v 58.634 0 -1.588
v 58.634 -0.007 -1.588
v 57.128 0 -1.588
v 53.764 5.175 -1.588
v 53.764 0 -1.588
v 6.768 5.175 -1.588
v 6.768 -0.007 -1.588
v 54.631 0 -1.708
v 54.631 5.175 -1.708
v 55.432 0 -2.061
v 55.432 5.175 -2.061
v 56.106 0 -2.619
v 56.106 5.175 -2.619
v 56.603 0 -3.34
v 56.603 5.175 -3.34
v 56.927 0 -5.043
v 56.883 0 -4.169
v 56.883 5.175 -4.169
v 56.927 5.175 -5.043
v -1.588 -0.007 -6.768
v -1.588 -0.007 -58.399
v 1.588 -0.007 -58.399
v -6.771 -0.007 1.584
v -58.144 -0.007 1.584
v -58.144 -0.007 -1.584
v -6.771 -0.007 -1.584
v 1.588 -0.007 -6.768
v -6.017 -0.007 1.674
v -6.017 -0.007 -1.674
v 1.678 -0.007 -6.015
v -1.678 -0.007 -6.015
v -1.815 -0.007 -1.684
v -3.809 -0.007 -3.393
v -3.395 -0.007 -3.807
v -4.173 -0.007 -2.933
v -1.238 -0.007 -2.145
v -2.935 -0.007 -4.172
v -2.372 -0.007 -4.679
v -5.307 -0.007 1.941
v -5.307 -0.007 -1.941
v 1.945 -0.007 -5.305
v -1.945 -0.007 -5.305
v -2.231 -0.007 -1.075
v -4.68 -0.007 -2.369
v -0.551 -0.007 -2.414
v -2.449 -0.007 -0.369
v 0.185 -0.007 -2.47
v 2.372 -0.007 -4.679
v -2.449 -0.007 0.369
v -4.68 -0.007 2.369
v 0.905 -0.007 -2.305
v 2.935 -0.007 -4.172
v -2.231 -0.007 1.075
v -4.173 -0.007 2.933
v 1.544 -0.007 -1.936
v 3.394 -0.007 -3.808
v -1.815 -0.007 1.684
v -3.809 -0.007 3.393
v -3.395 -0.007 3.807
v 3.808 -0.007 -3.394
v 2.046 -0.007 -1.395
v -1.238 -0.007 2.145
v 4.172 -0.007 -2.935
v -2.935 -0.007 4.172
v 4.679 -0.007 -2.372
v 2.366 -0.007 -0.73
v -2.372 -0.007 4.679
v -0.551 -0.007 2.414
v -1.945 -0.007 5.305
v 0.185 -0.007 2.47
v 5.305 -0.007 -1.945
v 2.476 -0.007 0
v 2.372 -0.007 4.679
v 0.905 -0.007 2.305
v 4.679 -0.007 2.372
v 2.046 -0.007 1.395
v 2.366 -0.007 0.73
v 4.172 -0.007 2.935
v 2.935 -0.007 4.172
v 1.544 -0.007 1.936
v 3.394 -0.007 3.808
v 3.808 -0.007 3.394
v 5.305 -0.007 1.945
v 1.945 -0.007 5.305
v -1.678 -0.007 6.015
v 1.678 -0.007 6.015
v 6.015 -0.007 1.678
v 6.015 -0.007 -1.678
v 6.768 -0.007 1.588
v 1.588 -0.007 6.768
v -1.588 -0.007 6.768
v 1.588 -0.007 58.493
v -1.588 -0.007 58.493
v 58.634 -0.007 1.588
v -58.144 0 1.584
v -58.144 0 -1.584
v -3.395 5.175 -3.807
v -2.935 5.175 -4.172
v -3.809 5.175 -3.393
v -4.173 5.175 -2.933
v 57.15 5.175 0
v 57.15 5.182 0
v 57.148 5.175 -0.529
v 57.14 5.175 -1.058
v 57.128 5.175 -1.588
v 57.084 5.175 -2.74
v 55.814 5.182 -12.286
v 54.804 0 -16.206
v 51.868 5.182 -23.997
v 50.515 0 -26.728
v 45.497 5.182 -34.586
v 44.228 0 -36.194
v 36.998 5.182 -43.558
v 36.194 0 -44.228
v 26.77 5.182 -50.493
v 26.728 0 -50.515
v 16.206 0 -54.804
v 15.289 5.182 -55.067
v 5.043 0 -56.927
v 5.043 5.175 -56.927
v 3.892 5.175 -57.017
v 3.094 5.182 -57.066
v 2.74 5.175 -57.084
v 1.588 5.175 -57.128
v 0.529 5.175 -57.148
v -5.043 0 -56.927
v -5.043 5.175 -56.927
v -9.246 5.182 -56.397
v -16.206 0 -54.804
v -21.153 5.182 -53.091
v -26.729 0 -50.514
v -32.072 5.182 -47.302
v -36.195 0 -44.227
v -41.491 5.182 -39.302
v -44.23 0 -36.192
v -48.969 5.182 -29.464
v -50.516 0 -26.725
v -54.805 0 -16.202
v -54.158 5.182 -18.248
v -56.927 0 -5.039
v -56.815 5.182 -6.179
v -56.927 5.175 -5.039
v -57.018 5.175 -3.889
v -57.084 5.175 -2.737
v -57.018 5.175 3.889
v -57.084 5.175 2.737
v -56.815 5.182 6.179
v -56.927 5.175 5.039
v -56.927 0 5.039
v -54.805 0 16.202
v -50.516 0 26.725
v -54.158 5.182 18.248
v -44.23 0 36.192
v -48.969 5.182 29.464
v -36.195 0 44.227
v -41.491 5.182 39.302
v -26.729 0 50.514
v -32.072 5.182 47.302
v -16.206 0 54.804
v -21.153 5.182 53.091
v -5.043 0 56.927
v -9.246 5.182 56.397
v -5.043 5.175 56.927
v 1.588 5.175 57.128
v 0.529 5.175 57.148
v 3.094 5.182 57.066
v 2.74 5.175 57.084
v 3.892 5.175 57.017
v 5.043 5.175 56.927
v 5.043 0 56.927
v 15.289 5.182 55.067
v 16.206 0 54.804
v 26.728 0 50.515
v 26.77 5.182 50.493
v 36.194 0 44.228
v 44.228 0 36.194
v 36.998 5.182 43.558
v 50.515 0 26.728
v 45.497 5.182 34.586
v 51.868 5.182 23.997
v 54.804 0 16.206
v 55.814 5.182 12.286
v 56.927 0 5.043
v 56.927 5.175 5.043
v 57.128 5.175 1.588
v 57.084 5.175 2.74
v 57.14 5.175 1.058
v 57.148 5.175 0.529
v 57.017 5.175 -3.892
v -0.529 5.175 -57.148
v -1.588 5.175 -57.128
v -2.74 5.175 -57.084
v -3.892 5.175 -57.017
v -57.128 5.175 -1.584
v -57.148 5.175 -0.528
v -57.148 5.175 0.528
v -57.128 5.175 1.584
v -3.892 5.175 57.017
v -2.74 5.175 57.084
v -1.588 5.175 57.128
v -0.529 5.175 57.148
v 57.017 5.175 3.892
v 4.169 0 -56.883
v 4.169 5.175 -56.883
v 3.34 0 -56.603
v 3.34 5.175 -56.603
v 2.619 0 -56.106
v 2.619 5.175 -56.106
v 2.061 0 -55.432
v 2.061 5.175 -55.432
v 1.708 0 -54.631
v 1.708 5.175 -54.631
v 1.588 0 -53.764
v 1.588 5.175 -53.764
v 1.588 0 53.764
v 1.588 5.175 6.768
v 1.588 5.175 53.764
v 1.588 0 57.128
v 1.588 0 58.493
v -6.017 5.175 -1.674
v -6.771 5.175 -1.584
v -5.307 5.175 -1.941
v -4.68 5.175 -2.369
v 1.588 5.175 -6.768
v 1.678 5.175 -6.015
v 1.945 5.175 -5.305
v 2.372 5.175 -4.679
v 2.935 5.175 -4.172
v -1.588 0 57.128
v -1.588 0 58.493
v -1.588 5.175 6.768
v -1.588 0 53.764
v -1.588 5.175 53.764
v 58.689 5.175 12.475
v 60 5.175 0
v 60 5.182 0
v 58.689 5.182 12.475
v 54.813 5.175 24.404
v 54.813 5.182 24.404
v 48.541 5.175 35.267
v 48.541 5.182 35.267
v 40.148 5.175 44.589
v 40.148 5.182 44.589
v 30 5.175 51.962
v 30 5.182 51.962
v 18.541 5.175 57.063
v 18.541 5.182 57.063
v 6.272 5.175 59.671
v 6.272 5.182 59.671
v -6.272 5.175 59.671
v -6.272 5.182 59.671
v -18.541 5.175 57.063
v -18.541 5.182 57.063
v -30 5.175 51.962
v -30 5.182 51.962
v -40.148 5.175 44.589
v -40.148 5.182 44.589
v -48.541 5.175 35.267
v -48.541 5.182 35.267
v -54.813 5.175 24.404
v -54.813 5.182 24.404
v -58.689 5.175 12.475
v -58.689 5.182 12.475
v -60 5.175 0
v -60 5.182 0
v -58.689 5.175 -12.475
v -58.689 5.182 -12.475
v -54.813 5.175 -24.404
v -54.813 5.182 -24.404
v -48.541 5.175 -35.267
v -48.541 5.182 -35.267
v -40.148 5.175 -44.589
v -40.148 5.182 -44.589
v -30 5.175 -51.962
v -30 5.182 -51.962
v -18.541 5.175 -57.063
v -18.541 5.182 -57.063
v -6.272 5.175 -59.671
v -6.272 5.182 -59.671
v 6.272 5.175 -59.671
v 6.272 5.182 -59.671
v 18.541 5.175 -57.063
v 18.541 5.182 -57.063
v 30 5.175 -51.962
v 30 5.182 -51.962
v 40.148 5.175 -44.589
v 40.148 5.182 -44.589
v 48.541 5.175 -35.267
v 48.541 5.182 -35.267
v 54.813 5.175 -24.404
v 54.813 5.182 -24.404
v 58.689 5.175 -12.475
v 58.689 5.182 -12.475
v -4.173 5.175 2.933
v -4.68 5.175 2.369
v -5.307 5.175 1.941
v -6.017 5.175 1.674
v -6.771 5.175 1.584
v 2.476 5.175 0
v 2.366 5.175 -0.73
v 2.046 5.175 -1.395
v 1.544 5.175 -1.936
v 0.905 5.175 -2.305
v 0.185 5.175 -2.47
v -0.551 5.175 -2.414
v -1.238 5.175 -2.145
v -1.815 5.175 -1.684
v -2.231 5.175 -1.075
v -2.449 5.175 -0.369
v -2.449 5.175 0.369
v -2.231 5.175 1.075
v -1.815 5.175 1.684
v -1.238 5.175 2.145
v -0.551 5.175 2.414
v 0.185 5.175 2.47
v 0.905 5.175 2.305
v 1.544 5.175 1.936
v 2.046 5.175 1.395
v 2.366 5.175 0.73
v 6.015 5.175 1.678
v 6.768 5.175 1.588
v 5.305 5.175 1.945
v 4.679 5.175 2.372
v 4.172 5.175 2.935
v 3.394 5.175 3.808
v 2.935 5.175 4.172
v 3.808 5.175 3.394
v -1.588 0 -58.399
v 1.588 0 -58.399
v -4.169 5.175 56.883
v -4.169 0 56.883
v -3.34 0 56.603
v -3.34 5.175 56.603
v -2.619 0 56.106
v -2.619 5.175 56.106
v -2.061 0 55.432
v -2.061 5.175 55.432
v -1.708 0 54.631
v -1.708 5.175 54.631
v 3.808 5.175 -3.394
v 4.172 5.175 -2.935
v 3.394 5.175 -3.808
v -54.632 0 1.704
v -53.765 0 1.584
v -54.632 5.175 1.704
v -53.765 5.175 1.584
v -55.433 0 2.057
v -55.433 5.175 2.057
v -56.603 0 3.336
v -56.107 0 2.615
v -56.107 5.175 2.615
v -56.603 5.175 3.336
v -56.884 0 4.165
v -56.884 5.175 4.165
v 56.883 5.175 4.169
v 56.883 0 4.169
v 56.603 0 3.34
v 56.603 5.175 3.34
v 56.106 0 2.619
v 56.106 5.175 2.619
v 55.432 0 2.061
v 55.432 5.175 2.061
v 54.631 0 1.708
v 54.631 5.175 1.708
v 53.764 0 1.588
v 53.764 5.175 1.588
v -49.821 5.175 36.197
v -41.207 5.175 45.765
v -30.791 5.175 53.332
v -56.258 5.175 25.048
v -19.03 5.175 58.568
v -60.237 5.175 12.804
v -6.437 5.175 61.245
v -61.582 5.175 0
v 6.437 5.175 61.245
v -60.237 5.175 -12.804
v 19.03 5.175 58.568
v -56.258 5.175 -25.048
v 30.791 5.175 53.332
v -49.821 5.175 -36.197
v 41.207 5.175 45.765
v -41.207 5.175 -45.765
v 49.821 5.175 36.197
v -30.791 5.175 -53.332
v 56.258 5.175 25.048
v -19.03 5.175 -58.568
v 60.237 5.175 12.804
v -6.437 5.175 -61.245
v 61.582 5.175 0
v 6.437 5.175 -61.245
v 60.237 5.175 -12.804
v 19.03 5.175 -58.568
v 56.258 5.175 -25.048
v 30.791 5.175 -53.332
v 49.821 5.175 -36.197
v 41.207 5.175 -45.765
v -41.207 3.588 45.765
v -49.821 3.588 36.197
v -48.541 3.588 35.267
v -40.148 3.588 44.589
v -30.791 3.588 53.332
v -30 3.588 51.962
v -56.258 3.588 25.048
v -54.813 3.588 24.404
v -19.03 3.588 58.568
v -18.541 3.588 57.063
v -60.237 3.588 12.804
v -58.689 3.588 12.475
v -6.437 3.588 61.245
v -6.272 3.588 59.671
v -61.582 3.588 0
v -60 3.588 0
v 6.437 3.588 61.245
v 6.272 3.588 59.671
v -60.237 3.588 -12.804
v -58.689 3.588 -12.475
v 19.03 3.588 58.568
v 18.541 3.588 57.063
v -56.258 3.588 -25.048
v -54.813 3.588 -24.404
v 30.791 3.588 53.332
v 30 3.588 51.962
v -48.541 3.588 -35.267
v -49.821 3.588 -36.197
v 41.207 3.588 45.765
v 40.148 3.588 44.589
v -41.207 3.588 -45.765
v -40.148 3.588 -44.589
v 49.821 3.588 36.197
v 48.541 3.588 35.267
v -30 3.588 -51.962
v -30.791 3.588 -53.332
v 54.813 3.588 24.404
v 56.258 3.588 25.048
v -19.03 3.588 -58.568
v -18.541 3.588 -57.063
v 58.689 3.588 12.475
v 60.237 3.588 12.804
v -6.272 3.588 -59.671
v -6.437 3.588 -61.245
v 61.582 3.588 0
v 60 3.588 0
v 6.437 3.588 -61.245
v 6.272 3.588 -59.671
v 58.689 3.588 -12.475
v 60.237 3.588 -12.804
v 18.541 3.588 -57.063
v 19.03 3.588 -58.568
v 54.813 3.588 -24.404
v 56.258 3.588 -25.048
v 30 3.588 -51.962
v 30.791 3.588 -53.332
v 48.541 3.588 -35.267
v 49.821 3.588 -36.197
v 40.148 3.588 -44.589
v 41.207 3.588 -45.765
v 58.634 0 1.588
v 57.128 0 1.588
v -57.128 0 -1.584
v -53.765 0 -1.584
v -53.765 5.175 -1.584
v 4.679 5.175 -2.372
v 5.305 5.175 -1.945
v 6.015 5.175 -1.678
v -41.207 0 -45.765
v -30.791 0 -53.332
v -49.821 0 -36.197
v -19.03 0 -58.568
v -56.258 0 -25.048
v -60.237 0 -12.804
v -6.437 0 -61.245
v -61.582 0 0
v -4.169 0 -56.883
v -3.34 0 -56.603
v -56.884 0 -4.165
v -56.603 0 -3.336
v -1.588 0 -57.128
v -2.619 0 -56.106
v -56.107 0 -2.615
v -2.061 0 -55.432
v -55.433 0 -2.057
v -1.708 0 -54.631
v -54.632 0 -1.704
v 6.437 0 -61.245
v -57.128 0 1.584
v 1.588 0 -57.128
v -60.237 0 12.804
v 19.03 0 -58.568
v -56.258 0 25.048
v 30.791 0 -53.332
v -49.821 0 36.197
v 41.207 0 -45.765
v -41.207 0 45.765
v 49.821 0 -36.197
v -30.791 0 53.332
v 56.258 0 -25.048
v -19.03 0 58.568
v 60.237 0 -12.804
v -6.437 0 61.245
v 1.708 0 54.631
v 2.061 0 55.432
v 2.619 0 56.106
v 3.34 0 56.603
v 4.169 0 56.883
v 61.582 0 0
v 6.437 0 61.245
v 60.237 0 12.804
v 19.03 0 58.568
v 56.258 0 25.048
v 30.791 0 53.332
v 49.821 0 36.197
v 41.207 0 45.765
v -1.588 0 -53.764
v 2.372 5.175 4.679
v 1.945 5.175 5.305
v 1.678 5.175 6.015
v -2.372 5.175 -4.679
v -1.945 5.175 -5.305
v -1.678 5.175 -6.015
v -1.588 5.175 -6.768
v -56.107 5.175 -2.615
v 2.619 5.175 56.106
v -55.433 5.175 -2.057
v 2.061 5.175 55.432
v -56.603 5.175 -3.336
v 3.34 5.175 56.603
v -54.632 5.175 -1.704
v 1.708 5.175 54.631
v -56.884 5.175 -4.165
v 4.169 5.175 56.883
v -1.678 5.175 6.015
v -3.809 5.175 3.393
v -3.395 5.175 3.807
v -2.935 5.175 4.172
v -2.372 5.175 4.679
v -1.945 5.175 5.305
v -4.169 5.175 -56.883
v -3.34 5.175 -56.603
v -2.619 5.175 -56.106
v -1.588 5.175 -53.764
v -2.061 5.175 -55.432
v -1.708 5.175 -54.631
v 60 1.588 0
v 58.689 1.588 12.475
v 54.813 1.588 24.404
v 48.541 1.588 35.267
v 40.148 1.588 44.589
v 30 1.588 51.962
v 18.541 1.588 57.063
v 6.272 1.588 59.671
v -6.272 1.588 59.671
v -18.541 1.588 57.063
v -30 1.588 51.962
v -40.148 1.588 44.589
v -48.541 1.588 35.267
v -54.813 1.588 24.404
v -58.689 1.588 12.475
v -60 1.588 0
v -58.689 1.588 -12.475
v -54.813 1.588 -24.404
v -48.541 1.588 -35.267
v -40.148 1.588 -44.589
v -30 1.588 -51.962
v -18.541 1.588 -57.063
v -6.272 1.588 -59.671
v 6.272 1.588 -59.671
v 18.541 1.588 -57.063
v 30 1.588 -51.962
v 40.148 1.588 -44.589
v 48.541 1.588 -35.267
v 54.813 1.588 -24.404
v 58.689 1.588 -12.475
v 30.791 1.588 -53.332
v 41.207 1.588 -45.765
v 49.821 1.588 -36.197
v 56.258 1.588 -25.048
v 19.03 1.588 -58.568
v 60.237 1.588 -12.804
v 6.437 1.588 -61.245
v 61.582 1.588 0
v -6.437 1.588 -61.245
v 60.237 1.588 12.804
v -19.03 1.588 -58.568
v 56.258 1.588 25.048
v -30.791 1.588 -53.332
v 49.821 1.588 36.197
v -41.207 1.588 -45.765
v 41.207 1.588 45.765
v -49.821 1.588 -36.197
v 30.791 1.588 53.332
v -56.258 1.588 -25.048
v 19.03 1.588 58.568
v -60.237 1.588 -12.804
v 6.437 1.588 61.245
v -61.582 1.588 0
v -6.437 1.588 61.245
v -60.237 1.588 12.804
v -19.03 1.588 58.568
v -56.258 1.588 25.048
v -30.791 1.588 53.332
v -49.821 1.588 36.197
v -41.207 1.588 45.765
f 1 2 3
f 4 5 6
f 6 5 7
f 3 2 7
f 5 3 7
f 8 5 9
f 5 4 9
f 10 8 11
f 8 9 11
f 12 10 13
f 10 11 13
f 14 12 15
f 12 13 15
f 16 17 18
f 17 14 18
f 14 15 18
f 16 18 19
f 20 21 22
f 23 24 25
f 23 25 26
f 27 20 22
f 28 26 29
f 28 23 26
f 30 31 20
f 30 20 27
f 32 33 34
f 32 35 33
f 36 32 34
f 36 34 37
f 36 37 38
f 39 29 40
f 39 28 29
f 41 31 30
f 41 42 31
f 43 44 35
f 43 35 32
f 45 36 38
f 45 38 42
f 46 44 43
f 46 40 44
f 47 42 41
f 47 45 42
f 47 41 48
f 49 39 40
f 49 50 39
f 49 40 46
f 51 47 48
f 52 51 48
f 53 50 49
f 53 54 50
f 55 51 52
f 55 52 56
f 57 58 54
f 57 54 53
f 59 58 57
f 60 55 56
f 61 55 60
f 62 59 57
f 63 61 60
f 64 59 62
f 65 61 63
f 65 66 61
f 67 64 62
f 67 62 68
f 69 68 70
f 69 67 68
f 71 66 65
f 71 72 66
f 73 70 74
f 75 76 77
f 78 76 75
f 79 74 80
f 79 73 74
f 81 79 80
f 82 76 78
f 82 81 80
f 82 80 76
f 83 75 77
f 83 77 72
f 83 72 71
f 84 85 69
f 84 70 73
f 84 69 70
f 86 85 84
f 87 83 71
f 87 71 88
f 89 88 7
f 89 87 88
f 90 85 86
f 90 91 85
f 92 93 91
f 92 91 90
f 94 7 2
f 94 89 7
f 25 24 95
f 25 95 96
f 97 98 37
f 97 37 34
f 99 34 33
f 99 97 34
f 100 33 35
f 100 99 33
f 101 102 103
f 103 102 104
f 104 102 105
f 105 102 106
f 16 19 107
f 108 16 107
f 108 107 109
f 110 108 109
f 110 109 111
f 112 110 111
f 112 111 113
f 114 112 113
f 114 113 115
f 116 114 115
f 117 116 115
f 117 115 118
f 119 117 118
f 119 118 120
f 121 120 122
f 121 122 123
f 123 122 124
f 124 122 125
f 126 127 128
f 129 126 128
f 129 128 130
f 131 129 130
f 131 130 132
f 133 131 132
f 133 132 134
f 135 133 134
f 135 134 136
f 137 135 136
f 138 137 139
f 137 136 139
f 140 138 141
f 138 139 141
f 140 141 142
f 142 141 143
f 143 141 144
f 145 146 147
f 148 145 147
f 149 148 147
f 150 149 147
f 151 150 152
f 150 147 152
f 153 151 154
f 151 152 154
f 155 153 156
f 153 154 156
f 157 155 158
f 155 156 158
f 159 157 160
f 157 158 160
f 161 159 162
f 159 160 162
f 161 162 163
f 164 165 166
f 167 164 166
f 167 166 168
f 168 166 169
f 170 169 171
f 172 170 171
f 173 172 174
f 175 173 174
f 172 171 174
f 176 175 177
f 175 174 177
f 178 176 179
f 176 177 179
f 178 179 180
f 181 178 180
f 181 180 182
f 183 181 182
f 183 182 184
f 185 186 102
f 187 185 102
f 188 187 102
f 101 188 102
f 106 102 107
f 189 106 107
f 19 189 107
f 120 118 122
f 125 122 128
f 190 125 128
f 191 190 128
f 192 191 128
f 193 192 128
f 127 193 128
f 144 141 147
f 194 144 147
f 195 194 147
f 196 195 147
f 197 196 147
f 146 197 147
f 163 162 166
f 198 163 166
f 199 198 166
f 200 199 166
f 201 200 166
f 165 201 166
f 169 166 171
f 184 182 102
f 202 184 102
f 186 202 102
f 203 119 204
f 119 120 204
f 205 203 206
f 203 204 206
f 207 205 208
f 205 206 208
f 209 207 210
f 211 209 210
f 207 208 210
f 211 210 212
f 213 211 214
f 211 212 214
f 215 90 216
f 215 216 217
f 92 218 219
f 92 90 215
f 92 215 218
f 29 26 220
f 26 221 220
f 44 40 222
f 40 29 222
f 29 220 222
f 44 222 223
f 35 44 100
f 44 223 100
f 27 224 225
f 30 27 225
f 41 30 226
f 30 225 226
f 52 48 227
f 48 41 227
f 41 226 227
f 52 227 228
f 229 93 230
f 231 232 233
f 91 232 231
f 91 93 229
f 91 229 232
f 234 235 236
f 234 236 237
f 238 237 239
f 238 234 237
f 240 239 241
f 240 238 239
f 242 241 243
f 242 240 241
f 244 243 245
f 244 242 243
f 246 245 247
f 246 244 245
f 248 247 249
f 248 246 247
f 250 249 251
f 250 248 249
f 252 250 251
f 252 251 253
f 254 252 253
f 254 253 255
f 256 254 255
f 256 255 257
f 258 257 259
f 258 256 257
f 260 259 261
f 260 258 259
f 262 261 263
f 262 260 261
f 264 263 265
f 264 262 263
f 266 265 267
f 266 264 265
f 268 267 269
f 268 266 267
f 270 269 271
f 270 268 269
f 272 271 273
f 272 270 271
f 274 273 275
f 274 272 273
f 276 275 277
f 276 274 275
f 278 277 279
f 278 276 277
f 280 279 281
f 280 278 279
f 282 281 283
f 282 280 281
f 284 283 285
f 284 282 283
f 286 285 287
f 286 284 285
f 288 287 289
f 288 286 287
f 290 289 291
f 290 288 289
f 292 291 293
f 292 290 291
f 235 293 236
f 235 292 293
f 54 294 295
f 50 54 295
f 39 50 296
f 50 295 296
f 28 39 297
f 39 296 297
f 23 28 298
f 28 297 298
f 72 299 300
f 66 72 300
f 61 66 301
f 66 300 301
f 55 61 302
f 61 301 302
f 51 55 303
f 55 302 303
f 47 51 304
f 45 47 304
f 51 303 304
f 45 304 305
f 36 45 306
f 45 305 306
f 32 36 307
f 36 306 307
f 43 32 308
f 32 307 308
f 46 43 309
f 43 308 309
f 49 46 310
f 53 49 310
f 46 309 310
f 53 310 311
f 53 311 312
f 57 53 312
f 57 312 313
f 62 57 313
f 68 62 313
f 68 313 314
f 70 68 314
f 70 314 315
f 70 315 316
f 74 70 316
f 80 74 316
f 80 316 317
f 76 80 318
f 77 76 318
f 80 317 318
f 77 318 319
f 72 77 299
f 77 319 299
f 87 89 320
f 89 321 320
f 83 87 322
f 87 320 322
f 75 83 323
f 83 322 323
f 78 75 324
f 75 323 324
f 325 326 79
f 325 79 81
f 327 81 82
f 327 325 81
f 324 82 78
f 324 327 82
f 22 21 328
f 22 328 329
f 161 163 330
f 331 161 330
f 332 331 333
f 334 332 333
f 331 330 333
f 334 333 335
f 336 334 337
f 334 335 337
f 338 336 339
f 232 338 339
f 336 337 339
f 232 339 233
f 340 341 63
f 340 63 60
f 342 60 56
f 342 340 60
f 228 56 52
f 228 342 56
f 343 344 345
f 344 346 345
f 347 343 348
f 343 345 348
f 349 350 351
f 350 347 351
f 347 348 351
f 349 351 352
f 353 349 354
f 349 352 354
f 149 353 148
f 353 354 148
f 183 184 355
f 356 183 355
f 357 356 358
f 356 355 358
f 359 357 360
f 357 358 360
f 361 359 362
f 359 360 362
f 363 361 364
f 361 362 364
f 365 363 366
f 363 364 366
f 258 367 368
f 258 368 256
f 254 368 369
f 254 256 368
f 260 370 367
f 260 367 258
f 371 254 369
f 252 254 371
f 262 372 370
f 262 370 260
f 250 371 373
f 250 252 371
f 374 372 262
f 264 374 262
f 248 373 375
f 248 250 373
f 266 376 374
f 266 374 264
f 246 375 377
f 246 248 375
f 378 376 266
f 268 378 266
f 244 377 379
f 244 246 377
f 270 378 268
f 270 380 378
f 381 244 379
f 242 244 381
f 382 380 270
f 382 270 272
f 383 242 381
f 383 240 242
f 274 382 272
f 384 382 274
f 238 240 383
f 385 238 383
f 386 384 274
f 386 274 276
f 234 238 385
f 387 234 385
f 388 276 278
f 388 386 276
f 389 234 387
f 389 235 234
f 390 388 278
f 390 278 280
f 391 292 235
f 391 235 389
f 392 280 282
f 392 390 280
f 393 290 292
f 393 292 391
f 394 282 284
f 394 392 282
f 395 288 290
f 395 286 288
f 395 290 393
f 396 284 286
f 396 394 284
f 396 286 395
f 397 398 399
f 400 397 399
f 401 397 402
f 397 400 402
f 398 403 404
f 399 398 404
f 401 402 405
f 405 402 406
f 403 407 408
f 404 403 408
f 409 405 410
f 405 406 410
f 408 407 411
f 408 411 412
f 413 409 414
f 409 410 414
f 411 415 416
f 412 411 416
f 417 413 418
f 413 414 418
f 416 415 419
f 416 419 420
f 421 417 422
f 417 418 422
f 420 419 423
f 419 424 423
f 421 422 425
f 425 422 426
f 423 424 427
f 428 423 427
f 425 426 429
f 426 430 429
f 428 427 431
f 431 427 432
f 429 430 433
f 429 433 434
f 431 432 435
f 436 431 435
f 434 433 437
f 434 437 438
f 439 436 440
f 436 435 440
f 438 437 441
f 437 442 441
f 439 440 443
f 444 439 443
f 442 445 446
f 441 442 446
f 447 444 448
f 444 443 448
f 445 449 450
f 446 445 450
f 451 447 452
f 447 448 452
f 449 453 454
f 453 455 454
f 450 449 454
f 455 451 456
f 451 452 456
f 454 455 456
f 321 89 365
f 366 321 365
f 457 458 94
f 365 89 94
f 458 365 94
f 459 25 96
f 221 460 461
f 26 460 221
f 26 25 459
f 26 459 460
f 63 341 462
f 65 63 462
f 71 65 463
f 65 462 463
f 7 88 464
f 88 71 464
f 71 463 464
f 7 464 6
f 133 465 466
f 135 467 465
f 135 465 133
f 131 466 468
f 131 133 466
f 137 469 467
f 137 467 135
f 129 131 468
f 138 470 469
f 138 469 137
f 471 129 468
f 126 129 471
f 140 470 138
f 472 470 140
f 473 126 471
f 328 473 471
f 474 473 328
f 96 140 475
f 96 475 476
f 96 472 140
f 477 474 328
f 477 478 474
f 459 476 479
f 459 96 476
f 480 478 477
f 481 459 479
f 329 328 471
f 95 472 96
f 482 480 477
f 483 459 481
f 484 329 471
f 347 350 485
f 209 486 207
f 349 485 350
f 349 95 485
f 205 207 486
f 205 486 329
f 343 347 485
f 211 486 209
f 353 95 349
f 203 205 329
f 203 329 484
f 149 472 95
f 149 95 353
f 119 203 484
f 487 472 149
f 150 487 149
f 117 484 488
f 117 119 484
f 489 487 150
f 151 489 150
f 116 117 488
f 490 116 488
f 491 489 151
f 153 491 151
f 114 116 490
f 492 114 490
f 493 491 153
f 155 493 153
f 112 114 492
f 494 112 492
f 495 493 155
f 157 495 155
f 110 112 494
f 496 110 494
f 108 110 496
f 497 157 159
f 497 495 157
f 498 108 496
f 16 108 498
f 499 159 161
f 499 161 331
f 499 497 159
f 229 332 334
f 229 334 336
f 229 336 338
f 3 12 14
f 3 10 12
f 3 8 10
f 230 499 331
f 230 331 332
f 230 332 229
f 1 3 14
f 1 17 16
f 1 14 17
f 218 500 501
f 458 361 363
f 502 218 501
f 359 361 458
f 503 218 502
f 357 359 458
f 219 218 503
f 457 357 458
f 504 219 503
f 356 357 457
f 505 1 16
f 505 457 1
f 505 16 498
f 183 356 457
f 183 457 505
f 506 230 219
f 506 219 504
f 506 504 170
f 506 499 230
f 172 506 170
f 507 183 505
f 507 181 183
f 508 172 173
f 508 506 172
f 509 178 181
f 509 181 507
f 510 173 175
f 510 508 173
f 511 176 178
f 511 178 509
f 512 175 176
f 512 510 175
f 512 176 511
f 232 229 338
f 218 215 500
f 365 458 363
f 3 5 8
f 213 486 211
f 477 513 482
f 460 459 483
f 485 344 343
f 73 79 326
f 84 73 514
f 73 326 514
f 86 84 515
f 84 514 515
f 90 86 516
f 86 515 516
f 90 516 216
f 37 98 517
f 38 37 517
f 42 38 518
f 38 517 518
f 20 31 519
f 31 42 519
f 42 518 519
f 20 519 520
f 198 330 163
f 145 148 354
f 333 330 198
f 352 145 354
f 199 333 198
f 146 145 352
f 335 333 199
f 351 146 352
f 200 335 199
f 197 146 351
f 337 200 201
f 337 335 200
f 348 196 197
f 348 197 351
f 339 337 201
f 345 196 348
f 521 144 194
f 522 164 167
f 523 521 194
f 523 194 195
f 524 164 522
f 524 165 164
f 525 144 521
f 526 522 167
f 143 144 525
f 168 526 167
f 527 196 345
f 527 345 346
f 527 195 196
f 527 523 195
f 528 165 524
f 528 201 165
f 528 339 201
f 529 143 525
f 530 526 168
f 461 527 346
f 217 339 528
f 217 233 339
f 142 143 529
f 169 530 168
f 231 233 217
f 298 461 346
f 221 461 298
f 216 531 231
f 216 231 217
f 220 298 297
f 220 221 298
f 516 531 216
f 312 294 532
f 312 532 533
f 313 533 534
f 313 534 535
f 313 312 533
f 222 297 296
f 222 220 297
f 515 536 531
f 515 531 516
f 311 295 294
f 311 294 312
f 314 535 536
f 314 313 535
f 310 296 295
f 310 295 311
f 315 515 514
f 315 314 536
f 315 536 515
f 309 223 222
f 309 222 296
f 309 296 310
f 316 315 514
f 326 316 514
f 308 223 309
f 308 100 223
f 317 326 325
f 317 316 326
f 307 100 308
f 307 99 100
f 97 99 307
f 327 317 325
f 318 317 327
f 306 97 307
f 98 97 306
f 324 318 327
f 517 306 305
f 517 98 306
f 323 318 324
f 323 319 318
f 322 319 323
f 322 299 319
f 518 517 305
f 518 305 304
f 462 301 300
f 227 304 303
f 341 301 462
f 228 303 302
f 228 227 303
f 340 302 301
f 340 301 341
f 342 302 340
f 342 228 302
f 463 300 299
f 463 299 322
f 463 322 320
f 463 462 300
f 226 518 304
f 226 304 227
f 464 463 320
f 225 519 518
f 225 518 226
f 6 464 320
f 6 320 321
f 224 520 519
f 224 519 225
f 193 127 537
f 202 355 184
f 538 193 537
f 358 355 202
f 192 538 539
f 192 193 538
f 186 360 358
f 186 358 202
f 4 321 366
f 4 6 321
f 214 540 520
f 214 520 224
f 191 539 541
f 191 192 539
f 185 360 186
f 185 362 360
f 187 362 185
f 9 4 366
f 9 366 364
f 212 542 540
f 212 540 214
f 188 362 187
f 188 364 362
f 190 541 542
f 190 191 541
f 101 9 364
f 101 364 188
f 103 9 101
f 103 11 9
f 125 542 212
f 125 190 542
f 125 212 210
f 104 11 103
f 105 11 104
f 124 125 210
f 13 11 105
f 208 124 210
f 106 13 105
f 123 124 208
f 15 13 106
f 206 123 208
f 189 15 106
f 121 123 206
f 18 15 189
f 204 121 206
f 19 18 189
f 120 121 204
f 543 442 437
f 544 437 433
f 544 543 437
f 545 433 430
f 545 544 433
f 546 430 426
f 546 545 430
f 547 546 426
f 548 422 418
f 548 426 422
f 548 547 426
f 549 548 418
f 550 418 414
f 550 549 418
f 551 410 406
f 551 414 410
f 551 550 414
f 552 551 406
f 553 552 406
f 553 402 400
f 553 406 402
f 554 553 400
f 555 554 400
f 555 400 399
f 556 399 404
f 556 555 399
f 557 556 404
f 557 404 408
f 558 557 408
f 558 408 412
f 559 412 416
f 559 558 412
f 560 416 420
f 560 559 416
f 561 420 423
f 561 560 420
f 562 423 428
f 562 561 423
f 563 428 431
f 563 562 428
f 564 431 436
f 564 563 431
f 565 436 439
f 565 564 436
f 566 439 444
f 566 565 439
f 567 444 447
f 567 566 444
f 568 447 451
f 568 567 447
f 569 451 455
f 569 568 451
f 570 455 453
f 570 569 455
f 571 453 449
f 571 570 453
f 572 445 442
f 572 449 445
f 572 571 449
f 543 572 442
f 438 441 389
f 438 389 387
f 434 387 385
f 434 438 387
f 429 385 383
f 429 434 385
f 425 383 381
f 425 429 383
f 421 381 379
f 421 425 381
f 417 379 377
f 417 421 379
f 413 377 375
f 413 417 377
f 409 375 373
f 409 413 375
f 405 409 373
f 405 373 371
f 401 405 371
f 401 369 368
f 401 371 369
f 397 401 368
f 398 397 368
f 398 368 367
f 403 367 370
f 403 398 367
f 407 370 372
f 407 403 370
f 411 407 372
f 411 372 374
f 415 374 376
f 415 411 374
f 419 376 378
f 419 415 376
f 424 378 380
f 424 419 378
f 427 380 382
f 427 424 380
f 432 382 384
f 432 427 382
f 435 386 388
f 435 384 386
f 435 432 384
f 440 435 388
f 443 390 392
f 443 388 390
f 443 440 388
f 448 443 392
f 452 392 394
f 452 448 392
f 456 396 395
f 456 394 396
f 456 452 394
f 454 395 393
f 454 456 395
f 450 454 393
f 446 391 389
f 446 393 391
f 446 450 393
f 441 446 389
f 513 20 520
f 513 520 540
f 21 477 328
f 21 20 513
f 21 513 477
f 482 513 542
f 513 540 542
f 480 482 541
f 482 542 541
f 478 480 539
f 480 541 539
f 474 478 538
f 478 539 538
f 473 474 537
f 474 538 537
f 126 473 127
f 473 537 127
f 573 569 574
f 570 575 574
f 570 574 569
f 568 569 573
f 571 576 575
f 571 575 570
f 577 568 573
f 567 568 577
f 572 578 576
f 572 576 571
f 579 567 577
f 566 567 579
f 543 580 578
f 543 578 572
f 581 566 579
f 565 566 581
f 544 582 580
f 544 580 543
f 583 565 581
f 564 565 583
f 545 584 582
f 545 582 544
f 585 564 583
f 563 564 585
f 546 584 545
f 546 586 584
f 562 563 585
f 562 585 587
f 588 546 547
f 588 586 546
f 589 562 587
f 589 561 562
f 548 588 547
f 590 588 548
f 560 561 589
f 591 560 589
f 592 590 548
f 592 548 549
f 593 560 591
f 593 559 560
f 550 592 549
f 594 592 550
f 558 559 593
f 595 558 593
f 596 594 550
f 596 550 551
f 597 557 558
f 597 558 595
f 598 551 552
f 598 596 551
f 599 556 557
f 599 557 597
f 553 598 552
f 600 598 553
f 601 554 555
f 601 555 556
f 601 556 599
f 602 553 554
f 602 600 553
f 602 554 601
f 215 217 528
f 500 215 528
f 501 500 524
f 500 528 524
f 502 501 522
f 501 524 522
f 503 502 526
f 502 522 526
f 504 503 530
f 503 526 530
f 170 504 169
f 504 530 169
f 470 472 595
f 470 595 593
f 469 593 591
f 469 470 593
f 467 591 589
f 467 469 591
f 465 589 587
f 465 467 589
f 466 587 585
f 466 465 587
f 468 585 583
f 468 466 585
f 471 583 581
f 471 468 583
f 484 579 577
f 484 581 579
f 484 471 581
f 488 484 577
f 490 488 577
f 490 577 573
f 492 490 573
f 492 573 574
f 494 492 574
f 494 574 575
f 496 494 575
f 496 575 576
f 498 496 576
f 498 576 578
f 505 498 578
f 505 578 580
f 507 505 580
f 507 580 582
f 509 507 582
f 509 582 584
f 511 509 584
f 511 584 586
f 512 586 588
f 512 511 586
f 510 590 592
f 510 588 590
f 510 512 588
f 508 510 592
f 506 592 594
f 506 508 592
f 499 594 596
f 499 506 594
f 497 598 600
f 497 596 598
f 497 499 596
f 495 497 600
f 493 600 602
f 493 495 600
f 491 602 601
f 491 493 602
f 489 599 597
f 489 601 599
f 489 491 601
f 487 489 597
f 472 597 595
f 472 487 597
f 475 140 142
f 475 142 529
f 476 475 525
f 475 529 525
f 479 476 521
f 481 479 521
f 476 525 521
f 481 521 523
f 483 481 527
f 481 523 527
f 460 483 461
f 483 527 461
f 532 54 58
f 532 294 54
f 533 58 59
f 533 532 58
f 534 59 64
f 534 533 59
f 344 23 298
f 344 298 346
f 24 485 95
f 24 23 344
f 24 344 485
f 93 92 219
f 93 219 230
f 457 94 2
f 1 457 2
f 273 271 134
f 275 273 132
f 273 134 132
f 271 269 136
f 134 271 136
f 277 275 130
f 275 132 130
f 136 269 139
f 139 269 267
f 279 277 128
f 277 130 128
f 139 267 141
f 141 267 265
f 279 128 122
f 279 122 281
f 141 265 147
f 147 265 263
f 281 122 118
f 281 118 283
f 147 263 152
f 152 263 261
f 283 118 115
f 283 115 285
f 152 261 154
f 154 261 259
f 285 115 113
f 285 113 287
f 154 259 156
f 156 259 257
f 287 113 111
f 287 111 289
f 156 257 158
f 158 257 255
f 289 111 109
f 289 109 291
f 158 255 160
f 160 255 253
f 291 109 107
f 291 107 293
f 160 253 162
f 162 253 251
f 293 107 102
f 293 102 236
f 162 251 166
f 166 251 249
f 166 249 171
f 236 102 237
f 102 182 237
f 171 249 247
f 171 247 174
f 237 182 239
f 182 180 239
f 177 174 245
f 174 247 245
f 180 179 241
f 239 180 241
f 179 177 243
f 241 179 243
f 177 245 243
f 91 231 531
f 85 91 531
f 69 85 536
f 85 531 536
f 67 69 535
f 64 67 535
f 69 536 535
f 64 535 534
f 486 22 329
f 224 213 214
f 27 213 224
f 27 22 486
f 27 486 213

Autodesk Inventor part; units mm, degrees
ref_plane "YZ Plane" through (0, 0, 0) normal (1, 0, 0) x (0, 1, 0)
ref_plane "XZ Plane" through (0, 0, 0) normal (0, 1, 0) x (-1, 0, 0)
ref_plane "XY Plane" through (0, 0, 0) normal (0, 0, 1) x (1, 0, 0)
sketch "Sketch1" plane through (0, 0, 0) normal (0, 1, 0) x (-1, 0, 0)
  circle A0 centre (0, 0) radius 60
  circle A1 centre (0, 0) radius 61.5823
  dimension "d0" = 120
  dimension "d1" = 123.1646
extrude "Extrusion1" add sketch "Sketch1" along normal blind 1.5875
sketch "Sketch2" plane through (0, 1.5875, 0) normal (0, 1, 0) x (1, 0, 0)
  circle A0 centre (0, 0) radius 60
  circle A1 centre (0, 0) radius 57.15
  dimension "d4" = 114.3
extrude "Extrusion2" add sketch "Sketch2" along normal blind 2
sketch "Sketch3" plane through (0, 3.5875, 0) normal (0, 1, 0) x (1, 0, 0)
  circle A0 centre (0, 0) radius 60
  circle A1 centre (0, 0) radius 61.5823
extrude "Extrusion3" add sketch "Sketch3" along normal blind 1.5875
sketch "Sketch4" plane through (0, 0, 0) normal (0, -1, 0) x (1, 0, 0)
  circle A0 centre (0, 0) radius 60
extrude "Extrusion4" add sketch "Sketch4" against normal blind 5.1816
sketch "Sketch5" plane through (0, 5.1816, 0) normal (0, 1, 0) x (1, 0, 0)
  circle A0 centre (0, 0) radius 57.15
  dimension "d11" = 114.3
extrude "Extrusion5" cut sketch "Sketch5" against normal blind 5.1816
sketch "Sketch6" plane through (0, 5.175, 0) normal (0, 1, 0) x (1, 0, 0)
  circle A0 centre (0, 0) radius 2.4765
  circle A1 centre (0, 0) radius 5.1008
  dimension "d14" = 4.953
extrude "Extrusion6" add sketch "Sketch6" against normal blind 5.1816
sketch "Sketch7" plane through (0, -0.0066, 0) normal (0, -1, 0) x (1, 0, 0)
  circle A0 centre (0, 0) radius 5.1008 projected
  circle A1 centre (0, 0) radius 57.15 projected
  line L0 (-3.0273, 1.5838) -> (-58.1435, 1.5838)
  line L1 (-58.1435, 1.5838) -> (-58.1435, -1.5838)
  line L2 (-58.1435, -1.5838) -> (-3.0273, -1.5838)
  line L3 (-3.0273, -1.5838) -> (-3.0273, 1.5838)
  line L4 (-3.0273, 1.5838) -> (-58.1435, -1.5838) construction
  line L5 (-58.1435, 1.5838) -> (-3.0273, -1.5838) construction
  line L6 (1.5875, 58.4929) -> (-1.5875, 58.4929)
  line L7 (-1.5875, 58.4929) -> (-1.5875, 3.6522)
  line L8 (-1.5875, 3.6522) -> (1.5875, 3.6522)
  line L9 (1.5875, 3.6522) -> (1.5875, 58.4929)
  line L10 (1.5875, 58.4929) -> (-1.5875, 3.6522) construction
  line L11 (-1.5875, 58.4929) -> (1.5875, 3.6522) construction
  line L12 (58.6337, -1.5875) -> (3.4947, -1.5875)
  line L13 (3.4947, -1.5875) -> (3.4947, 1.5875)
  line L14 (3.4947, 1.5875) -> (58.6337, 1.5875)
  line L15 (58.6337, 1.5875) -> (58.6337, -1.5875)
  line L16 (58.6337, -1.5875) -> (3.4947, 1.5875) construction
  line L17 (3.4947, -1.5875) -> (58.6337, 1.5875) construction
  line L18 (1.5875, -3.7293) -> (-1.5875, -3.7293)
  line L19 (-1.5875, -3.7293) -> (-1.5875, -58.3991)
  line L20 (-1.5875, -58.3991) -> (1.5875, -58.3991)
  line L21 (1.5875, -58.3991) -> (1.5875, -3.7293)
  line L22 (1.5875, -3.7293) -> (-1.5875, -58.3991) construction
  line L23 (-1.5875, -3.7293) -> (1.5875, -58.3991) construction
  point P0 (-30.5854, 0)
  point P1 (0, 31.0726)
  point P2 (31.0642, 0)
  point P3 (0, -31.0642)
  dimension "d17" = 3.175
  dimension "d18" = 3.175
extrude "Extrusion7" add sketch "Sketch7" against normal blind 5.1816 contours A0 L12 L13 L14 | A0 L14 A1 L12 | L9 L8 L7 A0 | A0 L7 A1 L9 | L14 L15 L12 A1 | L21 A1 L19 A0 | A0 L19 L18 L21 | A1 L7 L6 L9 | L21 L20 L19 A1 | L0 L3 L2 A0 | A0 L2 A1 L0 | A1 L2 L1 L0
fillet "Fillet1" radius 3.175 8 edges at (57.1279, 2.5875, 1.5875) (57.1279, 2.5875, -1.5875) (-1.5875, 2.5875, 57.1279) (1.5875, 2.5875, 57.1279) (-57.128, 2.5875, 1.5838) (-57.128, 2.5875, -1.5838) (-1.5875, 2.5875, -57.1279) (1.5875, 2.5875, -57.1279)
fillet "Fillet2" radius 3.175 8 edges at (4.8475, 2.5842, -1.5875) (1.5875, 2.5842, -4.8475) (-1.5875, 2.5842, 4.8475) (-4.8487, 2.5842, 1.5838) (-1.5875, 2.5842, -4.8475) (-4.8487, 2.5842, -1.5838) (4.8475, 2.5842, 1.5875) (1.5875, 2.5842, 4.8475)
properties part number "MTV Front Brake Axle (11.19)"
